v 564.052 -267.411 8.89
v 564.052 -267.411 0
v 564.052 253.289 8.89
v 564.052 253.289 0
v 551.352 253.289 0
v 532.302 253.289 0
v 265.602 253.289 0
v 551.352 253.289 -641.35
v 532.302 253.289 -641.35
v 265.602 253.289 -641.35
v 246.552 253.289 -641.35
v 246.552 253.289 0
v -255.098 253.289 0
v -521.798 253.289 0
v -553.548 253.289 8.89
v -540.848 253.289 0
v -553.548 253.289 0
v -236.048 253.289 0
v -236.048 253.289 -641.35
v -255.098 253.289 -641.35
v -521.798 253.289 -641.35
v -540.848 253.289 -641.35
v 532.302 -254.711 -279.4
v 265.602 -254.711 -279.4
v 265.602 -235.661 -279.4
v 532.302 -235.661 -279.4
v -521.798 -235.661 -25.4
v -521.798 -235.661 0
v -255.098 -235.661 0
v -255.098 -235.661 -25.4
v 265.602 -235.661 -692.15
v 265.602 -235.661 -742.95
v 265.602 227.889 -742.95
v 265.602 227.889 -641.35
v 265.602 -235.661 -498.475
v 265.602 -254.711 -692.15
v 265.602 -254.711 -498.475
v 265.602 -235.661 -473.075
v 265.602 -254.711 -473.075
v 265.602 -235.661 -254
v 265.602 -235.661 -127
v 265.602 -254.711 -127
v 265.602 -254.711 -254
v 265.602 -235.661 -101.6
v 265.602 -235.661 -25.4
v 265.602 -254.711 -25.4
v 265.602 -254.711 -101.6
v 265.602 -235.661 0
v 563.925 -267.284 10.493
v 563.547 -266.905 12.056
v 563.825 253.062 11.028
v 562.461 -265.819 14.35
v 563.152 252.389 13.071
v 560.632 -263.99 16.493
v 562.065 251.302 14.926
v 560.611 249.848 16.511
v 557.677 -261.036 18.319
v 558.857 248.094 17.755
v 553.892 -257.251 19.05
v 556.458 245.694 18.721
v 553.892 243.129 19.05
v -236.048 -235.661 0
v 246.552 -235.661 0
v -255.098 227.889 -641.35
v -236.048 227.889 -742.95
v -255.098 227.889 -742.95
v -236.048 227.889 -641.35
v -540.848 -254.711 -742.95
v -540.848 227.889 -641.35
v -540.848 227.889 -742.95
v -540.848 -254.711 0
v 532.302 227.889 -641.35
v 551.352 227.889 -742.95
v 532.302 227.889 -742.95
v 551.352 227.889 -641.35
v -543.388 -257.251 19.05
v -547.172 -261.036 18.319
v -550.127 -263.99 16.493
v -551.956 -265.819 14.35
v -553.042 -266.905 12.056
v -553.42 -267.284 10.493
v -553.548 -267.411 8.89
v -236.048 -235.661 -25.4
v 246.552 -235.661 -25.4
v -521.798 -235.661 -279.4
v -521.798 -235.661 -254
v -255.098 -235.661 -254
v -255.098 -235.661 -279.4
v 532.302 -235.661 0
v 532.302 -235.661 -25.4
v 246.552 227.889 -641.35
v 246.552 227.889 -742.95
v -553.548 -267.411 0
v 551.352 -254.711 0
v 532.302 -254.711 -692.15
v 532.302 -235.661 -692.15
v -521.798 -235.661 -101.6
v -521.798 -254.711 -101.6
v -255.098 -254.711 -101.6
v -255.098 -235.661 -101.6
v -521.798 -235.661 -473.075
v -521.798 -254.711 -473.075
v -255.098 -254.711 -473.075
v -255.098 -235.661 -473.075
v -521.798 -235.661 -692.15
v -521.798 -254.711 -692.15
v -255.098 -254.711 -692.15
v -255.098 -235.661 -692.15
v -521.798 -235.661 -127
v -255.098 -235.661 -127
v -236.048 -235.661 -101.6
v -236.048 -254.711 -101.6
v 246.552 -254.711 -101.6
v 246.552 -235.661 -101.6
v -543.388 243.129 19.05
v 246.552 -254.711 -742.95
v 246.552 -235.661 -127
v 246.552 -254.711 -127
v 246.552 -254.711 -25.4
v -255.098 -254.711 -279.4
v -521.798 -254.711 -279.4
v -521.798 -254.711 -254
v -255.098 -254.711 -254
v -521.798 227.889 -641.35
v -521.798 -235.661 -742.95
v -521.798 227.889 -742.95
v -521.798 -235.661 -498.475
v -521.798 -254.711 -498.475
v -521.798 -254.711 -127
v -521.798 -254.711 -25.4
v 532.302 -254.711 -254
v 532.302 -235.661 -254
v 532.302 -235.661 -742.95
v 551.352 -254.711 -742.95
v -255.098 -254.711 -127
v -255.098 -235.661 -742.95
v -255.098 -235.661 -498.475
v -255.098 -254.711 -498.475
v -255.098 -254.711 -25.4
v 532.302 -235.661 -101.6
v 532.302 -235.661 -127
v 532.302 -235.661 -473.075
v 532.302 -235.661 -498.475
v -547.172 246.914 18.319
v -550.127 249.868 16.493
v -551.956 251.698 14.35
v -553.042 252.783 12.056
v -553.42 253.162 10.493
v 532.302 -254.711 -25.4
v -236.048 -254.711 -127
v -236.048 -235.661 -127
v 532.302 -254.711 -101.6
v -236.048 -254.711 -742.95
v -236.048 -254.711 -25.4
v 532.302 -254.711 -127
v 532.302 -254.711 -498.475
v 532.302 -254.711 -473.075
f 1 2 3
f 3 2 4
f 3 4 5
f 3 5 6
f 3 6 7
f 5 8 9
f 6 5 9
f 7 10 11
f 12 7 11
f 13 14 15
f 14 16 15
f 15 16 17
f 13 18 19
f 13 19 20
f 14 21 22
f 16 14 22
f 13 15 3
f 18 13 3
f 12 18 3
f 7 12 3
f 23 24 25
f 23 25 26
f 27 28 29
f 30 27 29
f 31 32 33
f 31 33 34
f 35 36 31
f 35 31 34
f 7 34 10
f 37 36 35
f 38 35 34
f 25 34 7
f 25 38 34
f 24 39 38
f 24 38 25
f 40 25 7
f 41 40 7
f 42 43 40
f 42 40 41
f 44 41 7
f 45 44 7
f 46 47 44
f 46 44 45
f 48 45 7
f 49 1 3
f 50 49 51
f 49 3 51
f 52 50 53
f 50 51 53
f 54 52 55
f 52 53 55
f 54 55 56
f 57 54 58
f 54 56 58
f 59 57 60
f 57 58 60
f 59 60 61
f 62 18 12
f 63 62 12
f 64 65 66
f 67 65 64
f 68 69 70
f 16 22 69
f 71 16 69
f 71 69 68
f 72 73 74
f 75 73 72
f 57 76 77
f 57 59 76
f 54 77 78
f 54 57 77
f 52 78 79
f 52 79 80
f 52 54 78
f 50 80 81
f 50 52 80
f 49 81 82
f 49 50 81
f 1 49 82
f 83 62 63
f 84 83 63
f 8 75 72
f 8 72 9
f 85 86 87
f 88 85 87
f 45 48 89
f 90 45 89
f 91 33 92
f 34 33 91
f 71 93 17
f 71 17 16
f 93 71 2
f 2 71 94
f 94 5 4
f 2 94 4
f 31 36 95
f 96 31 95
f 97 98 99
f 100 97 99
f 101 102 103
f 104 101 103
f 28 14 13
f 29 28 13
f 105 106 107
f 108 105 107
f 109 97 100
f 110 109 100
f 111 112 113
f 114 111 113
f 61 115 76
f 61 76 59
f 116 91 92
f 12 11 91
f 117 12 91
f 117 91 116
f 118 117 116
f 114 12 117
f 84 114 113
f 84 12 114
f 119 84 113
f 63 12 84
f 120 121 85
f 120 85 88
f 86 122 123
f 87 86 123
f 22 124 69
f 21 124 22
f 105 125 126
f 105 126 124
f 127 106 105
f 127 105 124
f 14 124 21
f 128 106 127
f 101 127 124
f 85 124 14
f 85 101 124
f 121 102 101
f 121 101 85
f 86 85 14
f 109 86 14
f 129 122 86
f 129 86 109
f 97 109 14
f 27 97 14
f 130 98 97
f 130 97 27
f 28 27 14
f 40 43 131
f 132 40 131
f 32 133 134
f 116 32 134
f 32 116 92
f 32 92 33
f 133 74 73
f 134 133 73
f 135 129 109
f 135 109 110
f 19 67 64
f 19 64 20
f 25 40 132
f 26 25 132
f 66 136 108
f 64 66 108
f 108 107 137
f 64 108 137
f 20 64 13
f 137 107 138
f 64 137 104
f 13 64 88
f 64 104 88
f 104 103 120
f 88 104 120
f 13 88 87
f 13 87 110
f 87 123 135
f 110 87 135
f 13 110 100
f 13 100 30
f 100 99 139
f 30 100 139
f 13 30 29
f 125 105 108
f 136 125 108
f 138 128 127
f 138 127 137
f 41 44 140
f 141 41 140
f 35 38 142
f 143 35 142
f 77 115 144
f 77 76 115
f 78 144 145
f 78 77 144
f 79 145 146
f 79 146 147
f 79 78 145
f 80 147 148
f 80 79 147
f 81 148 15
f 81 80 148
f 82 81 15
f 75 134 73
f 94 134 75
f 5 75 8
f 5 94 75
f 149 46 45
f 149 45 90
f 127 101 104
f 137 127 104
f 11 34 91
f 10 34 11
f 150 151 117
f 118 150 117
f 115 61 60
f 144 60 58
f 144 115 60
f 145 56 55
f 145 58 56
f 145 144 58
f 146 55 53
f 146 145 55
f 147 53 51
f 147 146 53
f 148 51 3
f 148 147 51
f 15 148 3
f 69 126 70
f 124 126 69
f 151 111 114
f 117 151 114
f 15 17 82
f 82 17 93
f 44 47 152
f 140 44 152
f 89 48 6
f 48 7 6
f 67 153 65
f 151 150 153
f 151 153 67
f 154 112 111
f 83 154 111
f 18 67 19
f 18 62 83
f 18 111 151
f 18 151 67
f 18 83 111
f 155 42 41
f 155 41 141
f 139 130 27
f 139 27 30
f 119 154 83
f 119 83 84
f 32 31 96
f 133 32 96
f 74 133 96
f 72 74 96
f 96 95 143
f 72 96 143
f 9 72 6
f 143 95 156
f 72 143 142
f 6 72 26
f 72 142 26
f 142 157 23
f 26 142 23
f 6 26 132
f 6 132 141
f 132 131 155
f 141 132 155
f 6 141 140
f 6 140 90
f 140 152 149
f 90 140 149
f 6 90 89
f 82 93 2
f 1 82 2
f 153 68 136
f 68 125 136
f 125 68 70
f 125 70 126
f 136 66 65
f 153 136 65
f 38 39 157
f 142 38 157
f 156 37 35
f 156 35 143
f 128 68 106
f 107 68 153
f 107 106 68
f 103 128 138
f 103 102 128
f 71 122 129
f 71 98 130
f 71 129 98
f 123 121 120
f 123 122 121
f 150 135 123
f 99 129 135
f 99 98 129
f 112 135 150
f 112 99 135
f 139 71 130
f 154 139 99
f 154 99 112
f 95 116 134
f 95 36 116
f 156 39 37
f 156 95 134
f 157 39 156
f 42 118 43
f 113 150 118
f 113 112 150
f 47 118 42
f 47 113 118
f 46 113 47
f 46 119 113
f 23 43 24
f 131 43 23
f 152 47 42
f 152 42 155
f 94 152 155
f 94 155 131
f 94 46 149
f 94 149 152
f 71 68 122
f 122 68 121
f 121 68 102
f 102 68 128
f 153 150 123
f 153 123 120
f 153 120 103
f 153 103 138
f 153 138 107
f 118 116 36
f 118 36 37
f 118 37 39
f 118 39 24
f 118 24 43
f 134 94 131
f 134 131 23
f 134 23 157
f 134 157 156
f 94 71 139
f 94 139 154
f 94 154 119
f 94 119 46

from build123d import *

# Parameters (mm, degrees)
F0_W     = 482.6
F0_H     = 488.95
F0_W_2   = 266.7
F0_H_2   = 19.05
F1_DEPTH = 19.05
F2_DEPTH = 742.95
F3_DEPTH = 742.95
F4_R     = 10.16
F5_DEPTH = 127
F6_W     = 266.7
F6_H     = 193.675
F6_H_2   = 127
F6_H_3   = 76.2
F6_W_2   = 482.6
F7_DEPTH = 25.4
F8_W     = 25.4
F8_H     = 101.6
F9_DEPTH = 1104.901


with BuildPart() as f1:
    # F0 (on Top) → F1 (new body)
    with BuildSketch(Plane.XY):
        Polygon((265.602367, -235.660885), (265.602367, 253.289115), (246.552367, 253.289115), (246.552367, -235.660885), (246.552367, -254.710885), (265.602367, -254.710885), align=None)
        Polygon((551.352367, -254.710885), (551.352367, 253.289115), (532.302367, 253.289115), (532.302367, -235.660885), (532.302367, -254.710885), align=None)
        Polygon((-553.547633, 253.289115), (-553.547633, -267.410885), (564.052367, -267.410885), (564.052367, 253.289115), (551.352367, 253.289115), (551.352367, -254.710885), (532.302367, -254.710885), (265.602367, -254.710885), (246.552367, -254.710885), (-236.047633, -254.710885), (-255.097633, -254.710885), (-521.797633, -254.710885), (-540.847633, -254.710885), (-540.847633, 253.289115), align=None)
        with Locations((5.252367, 8.814115)):
            Rectangle(F0_W, F0_H)
        Polygon((-521.797633, 253.289115), (-540.847633, 253.289115), (-540.847633, -254.710885), (-521.797633, -254.710885), (-521.797633, -235.660885), align=None)
        with Locations((398.952367, 8.814115)):
            Rectangle(F0_W_2, F0_H)
        Polygon((-236.047633, 253.289115), (-255.097633, 253.289115), (-255.097633, -235.660885), (-255.097633, -254.710885), (-236.047633, -254.710885), (-236.047633, -235.660885), align=None)
        with Locations((-388.447633, 8.814115)):
            Rectangle(F0_W_2, F0_H)
        with Locations((-388.447633, -245.185885)):
            Rectangle(F0_W_2, F0_H_2)
        with Locations((5.252367, -245.185885)):
            Rectangle(F0_W, F0_H_2)
        with Locations((398.952367, -245.185885)):
            Rectangle(F0_W_2, F0_H_2)
    extrude(amount=F1_DEPTH)

    # F0 (on Top) → F2 (join)
    with BuildSketch(Plane.XY):
        Polygon((-521.797633, 253.289115), (-540.847633, 253.289115), (-540.847633, -254.710885), (-521.797633, -254.710885), (-521.797633, -235.660885), align=None)
        Polygon((-236.047633, 253.289115), (-255.097633, 253.289115), (-255.097633, -235.660885), (-255.097633, -254.710885), (-236.047633, -254.710885), (-236.047633, -235.660885), align=None)
        Polygon((265.602367, -235.660885), (265.602367, 253.289115), (246.552367, 253.289115), (246.552367, -235.660885), (246.552367, -254.710885), (265.602367, -254.710885), align=None)
        Polygon((551.352367, -254.710885), (551.352367, 253.289115), (532.302367, 253.289115), (532.302367, -235.660885), (532.302367, -254.710885), align=None)
    extrude(amount=-F2_DEPTH)

    # F0 (on Top) → F3 (join)
    with BuildSketch(Plane.XY):
        with Locations((-388.447633, -245.185885)):
            Rectangle(F0_W_2, F0_H_2)
        with Locations((398.952367, -245.185885)):
            Rectangle(F0_W_2, F0_H_2)
    extrude(amount=-F3_DEPTH)

    # F4
    f4_edges = [f1.edges().sort_by_distance(p)[0] for p in [
        (-553.547633, -7.060885, 19.05),
        (5.252367, -267.410885, 19.05),
        (564.052367, -7.060885, 19.05),
        (5.252367, 253.289115, 19.05),
    ]]
    fillet(f4_edges, radius=F4_R)

    # F0 (on Top) → F5 (join)
    with BuildSketch(Plane.XY):
        with Locations((5.252367, -245.185885)):
            Rectangle(F0_W, F0_H_2)
    extrude(amount=-F5_DEPTH)

    # F6 (on face) → F7 (cut)
    with BuildSketch(Plane.XZ.offset(254.710885)):
        with Locations((-388.447633, -595.3125)):
            Rectangle(F6_W, F6_H)
        with Locations((-388.447633, -376.2375)):
            Rectangle(F6_W, F6_H)
        with Locations((-388.447633, -190.5)):
            Rectangle(F6_W, F6_H_2)
        with Locations((-388.447633, -63.5)):
            Rectangle(F6_W, F6_H_3)
        with Locations((5.252367, -63.5)):
            Rectangle(F6_W_2, F6_H_3)
        with Locations((398.952367, -63.5)):
            Rectangle(F6_W, F6_H_3)
        with Locations((398.952367, -190.5)):
            Rectangle(F6_W, F6_H_2)
        with Locations((398.952367, -376.2375)):
            Rectangle(F6_W, F6_H)
        with Locations((398.952367, -595.3125)):
            Rectangle(F6_W, F6_H)
    extrude(amount=-F7_DEPTH, mode=Mode.SUBTRACT)

    # F8 (on face) → F9 (cut, through all)
    with BuildSketch(Plane.YZ.offset(551.352367)):
        with Locations((240.589115, -692.15)):
            Rectangle(F8_W, F8_H)
    extrude(amount=-F9_DEPTH, mode=Mode.SUBTRACT)


solid = f1.part
